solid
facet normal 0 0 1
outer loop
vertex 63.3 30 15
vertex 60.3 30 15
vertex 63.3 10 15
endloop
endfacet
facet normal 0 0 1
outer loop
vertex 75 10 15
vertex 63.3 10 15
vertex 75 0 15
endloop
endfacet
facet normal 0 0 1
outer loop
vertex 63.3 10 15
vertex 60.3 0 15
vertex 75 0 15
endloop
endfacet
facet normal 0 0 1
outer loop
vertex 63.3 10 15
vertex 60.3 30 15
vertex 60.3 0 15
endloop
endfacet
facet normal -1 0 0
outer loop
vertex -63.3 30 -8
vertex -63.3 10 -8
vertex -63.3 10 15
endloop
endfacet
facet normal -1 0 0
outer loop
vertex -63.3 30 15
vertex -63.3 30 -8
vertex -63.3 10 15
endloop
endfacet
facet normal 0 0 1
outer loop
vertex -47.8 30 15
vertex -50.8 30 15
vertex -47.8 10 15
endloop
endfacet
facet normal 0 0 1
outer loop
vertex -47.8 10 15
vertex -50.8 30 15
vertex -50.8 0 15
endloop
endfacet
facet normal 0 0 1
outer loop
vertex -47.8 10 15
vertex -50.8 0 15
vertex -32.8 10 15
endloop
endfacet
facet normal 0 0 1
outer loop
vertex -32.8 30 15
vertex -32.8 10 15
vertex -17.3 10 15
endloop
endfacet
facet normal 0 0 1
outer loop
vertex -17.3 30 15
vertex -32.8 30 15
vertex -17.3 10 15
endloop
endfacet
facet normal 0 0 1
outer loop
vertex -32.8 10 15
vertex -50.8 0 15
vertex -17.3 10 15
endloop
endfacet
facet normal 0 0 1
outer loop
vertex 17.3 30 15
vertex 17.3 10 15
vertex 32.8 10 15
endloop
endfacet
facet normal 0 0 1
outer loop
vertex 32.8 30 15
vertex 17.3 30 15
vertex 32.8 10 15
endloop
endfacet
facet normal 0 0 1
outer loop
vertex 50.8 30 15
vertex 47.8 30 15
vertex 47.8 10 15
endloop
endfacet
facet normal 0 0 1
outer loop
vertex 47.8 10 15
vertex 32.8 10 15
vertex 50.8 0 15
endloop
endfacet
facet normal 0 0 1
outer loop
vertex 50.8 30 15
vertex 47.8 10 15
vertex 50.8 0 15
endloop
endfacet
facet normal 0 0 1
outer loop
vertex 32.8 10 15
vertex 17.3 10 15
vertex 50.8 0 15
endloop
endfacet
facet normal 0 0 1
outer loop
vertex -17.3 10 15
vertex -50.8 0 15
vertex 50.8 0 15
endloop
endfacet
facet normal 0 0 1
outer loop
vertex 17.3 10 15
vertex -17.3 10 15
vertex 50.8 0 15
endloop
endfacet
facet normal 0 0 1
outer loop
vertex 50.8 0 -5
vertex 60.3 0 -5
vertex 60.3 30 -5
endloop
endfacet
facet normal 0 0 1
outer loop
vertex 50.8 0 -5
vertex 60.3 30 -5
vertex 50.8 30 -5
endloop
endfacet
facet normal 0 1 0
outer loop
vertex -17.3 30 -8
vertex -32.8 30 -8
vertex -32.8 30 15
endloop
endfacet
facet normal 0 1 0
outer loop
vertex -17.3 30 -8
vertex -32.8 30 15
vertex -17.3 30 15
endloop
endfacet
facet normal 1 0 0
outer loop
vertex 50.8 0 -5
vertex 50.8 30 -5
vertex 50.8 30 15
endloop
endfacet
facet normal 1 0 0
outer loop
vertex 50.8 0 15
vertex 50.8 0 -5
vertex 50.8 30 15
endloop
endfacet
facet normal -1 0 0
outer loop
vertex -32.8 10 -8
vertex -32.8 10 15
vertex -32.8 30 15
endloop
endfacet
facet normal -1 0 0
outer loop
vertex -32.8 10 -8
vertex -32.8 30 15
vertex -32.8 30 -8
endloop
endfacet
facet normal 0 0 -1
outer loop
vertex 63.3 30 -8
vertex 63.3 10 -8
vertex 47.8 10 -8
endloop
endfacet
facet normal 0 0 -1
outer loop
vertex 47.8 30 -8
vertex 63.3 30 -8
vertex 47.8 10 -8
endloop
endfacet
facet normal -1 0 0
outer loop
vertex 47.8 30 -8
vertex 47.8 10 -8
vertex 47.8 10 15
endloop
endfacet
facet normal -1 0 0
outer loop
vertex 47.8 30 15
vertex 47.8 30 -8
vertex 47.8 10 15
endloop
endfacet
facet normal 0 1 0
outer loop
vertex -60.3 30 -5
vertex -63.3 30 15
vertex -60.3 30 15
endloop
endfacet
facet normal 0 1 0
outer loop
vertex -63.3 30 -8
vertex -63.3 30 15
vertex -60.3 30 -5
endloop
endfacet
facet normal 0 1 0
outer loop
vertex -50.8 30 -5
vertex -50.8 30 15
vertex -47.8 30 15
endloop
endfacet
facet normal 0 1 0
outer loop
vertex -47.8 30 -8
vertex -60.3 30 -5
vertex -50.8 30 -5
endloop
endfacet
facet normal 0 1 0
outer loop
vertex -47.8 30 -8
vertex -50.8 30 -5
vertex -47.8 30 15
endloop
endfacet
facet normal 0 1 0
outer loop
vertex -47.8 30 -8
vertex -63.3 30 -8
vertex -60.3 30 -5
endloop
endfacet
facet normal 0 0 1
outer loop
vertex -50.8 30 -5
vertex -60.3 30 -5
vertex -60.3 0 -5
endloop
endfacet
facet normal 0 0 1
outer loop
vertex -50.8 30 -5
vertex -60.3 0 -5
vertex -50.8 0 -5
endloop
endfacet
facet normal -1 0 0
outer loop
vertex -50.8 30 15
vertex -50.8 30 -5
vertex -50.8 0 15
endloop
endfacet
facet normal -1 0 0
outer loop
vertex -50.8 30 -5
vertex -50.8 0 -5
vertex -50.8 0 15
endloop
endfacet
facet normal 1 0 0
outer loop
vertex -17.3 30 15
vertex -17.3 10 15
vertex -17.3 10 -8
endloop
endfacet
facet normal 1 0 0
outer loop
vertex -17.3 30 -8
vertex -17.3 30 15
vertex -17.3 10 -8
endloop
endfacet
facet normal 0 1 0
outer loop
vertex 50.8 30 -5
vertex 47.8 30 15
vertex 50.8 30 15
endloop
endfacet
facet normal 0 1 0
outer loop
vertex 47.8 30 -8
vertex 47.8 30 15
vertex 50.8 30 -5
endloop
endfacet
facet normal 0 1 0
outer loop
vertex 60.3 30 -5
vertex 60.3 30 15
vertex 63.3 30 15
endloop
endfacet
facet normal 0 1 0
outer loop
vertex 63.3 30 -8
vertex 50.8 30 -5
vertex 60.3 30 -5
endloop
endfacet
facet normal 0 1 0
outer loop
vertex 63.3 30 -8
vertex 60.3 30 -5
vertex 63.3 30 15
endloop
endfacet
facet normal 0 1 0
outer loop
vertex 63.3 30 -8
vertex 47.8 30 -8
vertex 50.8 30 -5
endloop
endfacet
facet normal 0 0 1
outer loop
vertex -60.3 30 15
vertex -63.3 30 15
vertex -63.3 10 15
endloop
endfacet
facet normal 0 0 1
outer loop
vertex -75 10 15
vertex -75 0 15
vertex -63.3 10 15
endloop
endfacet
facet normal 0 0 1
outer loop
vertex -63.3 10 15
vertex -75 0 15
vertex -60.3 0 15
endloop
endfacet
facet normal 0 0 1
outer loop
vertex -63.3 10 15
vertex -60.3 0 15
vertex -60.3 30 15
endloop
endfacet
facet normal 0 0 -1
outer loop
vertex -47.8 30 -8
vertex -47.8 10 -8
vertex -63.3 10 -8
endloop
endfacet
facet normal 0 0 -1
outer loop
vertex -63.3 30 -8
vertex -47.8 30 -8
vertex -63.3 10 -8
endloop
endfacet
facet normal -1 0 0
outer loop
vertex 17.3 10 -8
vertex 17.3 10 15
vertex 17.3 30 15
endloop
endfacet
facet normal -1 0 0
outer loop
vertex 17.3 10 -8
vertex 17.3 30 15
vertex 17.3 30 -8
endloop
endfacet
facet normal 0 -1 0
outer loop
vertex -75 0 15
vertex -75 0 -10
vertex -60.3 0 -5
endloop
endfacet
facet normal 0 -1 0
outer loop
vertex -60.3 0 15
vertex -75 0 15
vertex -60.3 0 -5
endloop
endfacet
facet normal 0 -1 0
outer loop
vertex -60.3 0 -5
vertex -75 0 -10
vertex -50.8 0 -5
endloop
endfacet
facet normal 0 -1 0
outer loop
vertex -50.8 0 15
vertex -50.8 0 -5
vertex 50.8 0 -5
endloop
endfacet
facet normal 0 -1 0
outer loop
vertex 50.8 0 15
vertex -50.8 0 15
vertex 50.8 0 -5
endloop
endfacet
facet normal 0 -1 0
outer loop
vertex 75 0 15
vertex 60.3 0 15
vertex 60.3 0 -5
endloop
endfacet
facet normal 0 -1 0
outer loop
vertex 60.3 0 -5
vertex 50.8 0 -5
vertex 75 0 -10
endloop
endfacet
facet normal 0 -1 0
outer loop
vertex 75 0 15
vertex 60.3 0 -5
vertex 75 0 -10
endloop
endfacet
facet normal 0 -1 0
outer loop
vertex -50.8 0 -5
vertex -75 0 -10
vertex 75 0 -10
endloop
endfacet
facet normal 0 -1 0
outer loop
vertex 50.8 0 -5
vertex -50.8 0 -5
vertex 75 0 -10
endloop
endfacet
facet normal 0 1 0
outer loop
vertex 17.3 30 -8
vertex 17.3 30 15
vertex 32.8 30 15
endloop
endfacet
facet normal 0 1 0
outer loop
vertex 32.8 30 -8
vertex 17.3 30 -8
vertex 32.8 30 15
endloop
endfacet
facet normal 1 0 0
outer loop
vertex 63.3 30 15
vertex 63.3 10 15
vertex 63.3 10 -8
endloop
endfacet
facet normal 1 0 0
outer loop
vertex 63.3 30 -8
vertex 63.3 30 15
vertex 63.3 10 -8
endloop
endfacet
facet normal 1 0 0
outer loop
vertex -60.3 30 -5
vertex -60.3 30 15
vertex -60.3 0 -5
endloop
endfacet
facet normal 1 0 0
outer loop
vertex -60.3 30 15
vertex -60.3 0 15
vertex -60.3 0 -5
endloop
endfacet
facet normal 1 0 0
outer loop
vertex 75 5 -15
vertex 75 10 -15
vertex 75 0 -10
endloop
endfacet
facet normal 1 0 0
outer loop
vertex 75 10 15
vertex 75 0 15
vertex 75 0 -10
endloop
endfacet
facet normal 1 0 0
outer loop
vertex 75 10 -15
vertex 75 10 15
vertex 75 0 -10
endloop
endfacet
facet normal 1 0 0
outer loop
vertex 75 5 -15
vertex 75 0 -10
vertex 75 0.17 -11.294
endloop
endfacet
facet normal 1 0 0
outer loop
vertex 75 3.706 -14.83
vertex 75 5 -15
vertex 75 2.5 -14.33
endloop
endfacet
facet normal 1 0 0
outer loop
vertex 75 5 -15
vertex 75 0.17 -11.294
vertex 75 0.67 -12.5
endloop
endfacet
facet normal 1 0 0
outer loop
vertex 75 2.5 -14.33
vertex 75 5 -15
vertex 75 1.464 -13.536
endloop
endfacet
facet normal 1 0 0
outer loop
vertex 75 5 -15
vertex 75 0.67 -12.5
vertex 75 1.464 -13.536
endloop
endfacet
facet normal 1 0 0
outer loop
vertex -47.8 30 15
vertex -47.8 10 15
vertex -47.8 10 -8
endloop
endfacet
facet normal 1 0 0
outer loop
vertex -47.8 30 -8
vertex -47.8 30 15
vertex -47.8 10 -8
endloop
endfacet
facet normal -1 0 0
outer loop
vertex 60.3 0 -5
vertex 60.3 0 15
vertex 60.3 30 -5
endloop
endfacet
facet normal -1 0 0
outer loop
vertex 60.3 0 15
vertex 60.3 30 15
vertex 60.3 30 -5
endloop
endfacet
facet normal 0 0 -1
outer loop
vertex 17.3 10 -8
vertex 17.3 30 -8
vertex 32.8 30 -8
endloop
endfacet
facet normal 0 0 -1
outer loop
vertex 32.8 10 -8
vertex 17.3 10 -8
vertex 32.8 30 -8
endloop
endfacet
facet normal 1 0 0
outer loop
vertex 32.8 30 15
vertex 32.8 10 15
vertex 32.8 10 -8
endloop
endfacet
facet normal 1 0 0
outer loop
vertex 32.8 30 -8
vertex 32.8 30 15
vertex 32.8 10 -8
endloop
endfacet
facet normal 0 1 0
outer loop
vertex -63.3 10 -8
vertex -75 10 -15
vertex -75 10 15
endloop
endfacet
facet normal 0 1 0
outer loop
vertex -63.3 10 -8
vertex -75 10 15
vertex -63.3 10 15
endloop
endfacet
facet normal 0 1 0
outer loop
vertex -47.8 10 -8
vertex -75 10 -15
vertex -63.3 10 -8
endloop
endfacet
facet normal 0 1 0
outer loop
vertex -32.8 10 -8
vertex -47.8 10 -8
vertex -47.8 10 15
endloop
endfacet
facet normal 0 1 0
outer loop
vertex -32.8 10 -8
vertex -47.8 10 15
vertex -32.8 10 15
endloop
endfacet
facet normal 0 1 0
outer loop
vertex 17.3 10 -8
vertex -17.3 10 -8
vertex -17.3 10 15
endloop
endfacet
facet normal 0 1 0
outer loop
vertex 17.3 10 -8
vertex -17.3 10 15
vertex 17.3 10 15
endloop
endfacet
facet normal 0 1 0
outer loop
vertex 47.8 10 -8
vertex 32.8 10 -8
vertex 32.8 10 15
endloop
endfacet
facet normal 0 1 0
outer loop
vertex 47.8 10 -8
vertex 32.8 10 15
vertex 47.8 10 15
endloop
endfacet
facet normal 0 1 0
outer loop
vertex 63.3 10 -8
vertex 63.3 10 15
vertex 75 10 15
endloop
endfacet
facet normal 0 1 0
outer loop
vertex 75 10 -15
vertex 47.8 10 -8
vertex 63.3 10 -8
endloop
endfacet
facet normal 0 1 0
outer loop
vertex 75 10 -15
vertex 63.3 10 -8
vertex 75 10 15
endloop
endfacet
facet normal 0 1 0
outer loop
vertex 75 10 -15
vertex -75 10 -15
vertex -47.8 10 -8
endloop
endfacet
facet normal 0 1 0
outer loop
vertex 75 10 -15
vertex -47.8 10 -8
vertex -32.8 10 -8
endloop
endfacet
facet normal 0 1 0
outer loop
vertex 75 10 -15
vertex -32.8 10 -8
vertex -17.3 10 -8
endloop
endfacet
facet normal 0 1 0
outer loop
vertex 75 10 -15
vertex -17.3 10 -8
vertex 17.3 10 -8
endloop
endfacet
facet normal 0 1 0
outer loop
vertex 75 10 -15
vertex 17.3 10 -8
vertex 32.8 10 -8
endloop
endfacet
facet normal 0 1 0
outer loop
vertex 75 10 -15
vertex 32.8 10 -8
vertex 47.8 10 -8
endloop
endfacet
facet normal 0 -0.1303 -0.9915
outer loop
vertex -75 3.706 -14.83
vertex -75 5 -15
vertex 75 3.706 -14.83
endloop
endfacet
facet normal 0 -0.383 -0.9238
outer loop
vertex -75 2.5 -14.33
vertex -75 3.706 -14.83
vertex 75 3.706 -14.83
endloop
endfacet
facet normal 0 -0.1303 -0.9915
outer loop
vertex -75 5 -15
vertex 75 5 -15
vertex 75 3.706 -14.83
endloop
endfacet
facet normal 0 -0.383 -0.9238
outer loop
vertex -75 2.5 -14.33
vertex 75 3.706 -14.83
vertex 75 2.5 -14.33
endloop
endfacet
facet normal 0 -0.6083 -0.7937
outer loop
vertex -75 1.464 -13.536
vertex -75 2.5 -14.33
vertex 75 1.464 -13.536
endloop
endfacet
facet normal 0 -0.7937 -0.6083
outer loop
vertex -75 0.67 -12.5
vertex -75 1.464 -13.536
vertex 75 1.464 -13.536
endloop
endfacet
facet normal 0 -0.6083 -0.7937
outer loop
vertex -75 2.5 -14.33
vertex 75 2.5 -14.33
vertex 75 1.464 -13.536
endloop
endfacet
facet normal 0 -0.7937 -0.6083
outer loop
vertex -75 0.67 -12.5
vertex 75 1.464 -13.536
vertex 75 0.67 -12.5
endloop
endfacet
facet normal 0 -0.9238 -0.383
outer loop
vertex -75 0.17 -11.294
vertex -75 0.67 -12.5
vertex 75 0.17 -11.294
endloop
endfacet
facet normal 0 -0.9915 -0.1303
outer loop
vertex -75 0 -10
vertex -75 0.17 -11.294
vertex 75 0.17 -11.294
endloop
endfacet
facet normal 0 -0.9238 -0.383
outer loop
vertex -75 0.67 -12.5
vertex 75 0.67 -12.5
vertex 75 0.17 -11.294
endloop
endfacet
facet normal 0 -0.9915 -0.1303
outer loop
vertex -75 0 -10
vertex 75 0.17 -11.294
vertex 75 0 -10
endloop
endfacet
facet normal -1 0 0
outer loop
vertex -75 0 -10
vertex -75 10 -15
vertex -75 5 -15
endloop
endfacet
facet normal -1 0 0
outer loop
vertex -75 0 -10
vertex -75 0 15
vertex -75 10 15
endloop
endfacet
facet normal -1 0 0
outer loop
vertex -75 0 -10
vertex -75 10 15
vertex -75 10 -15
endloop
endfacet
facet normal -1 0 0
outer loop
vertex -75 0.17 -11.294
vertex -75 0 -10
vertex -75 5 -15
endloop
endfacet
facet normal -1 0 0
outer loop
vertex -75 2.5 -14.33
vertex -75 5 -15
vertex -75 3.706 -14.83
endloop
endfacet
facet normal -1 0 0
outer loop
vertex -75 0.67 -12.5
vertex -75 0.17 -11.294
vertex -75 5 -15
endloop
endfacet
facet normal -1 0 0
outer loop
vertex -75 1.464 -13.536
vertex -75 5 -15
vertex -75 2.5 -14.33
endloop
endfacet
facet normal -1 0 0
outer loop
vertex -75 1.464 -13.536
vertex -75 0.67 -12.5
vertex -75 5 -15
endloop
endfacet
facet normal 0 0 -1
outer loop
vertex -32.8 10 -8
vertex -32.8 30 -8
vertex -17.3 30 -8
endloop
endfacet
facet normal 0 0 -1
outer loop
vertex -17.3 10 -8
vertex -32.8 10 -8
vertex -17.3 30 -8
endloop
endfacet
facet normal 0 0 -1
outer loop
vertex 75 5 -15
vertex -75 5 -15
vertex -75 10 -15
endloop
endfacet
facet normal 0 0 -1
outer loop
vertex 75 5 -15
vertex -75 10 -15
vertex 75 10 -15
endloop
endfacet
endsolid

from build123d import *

# Parameters (mm, degrees)
SKETCH1_W           = 150
SKETCH1_H           = 30
BOSS_EXTRUDE1_DEPTH = 10
SKETCH2_W           = 9.5
SKETCH2_H           = 20
CUT_EXTRUDE1_DEPTH  = 10
SKETCH2_3_W         = 15.5
SKETCH2_3_H         = 23
BOSS_EXTRUDE2_DEPTH = 20
FILLET1_R           = 5


with BuildPart() as part:
    # Sketch1 → Boss-Extrude1 (new body)
    with BuildSketch(Plane(origin=(0, 0, 0), x_dir=(1, 0, 0), z_dir=(0, 1, 0))):
        Rectangle(SKETCH1_W, SKETCH1_H)
    extrude(amount=BOSS_EXTRUDE1_DEPTH)

    # Sketch2 → Cut-Extrude1 (cut)
    with BuildSketch(Plane(origin=(0, 10, 0), x_dir=(1, 0, 0), z_dir=(0, 1, 0))):
        with Locations((-55.55, -5)):
            Rectangle(SKETCH2_W, SKETCH2_H)
        with Locations((55.55, -5)):
            Rectangle(SKETCH2_W, SKETCH2_H)
    extrude(amount=-CUT_EXTRUDE1_DEPTH, mode=Mode.SUBTRACT)

    # Sketch2<3> → Boss-Extrude2 (add)
    with BuildSketch(Plane(origin=(0, 10, 0), x_dir=(1, 0, 0), z_dir=(0, 1, 0))):
        Polygon((-63.3, 8), (-63.3, -15), (-60.3, -15), (-60.3, 5), (-50.8, 5), (-50.8, -15), (-47.8, -15), (-47.8, 8), align=None)
        Polygon((47.8, 8), (47.8, -15), (50.8, -15), (50.8, 5), (60.3, 5), (60.3, -15), (63.3, -15), (63.3, 8), align=None)
        with Locations((25.05, -3.5)):
            Rectangle(SKETCH2_3_W, SKETCH2_3_H)
        with Locations((-25.05, -3.5)):
            Rectangle(SKETCH2_3_W, SKETCH2_3_H)
    extrude(amount=BOSS_EXTRUDE2_DEPTH)

    # Fillet1
    fillet1_edges = [part.edges().sort_by_distance(p)[0] for p in [
        (0, 0, -15),
    ]]
    fillet(fillet1_edges, radius=FILLET1_R)


solid = part.part
